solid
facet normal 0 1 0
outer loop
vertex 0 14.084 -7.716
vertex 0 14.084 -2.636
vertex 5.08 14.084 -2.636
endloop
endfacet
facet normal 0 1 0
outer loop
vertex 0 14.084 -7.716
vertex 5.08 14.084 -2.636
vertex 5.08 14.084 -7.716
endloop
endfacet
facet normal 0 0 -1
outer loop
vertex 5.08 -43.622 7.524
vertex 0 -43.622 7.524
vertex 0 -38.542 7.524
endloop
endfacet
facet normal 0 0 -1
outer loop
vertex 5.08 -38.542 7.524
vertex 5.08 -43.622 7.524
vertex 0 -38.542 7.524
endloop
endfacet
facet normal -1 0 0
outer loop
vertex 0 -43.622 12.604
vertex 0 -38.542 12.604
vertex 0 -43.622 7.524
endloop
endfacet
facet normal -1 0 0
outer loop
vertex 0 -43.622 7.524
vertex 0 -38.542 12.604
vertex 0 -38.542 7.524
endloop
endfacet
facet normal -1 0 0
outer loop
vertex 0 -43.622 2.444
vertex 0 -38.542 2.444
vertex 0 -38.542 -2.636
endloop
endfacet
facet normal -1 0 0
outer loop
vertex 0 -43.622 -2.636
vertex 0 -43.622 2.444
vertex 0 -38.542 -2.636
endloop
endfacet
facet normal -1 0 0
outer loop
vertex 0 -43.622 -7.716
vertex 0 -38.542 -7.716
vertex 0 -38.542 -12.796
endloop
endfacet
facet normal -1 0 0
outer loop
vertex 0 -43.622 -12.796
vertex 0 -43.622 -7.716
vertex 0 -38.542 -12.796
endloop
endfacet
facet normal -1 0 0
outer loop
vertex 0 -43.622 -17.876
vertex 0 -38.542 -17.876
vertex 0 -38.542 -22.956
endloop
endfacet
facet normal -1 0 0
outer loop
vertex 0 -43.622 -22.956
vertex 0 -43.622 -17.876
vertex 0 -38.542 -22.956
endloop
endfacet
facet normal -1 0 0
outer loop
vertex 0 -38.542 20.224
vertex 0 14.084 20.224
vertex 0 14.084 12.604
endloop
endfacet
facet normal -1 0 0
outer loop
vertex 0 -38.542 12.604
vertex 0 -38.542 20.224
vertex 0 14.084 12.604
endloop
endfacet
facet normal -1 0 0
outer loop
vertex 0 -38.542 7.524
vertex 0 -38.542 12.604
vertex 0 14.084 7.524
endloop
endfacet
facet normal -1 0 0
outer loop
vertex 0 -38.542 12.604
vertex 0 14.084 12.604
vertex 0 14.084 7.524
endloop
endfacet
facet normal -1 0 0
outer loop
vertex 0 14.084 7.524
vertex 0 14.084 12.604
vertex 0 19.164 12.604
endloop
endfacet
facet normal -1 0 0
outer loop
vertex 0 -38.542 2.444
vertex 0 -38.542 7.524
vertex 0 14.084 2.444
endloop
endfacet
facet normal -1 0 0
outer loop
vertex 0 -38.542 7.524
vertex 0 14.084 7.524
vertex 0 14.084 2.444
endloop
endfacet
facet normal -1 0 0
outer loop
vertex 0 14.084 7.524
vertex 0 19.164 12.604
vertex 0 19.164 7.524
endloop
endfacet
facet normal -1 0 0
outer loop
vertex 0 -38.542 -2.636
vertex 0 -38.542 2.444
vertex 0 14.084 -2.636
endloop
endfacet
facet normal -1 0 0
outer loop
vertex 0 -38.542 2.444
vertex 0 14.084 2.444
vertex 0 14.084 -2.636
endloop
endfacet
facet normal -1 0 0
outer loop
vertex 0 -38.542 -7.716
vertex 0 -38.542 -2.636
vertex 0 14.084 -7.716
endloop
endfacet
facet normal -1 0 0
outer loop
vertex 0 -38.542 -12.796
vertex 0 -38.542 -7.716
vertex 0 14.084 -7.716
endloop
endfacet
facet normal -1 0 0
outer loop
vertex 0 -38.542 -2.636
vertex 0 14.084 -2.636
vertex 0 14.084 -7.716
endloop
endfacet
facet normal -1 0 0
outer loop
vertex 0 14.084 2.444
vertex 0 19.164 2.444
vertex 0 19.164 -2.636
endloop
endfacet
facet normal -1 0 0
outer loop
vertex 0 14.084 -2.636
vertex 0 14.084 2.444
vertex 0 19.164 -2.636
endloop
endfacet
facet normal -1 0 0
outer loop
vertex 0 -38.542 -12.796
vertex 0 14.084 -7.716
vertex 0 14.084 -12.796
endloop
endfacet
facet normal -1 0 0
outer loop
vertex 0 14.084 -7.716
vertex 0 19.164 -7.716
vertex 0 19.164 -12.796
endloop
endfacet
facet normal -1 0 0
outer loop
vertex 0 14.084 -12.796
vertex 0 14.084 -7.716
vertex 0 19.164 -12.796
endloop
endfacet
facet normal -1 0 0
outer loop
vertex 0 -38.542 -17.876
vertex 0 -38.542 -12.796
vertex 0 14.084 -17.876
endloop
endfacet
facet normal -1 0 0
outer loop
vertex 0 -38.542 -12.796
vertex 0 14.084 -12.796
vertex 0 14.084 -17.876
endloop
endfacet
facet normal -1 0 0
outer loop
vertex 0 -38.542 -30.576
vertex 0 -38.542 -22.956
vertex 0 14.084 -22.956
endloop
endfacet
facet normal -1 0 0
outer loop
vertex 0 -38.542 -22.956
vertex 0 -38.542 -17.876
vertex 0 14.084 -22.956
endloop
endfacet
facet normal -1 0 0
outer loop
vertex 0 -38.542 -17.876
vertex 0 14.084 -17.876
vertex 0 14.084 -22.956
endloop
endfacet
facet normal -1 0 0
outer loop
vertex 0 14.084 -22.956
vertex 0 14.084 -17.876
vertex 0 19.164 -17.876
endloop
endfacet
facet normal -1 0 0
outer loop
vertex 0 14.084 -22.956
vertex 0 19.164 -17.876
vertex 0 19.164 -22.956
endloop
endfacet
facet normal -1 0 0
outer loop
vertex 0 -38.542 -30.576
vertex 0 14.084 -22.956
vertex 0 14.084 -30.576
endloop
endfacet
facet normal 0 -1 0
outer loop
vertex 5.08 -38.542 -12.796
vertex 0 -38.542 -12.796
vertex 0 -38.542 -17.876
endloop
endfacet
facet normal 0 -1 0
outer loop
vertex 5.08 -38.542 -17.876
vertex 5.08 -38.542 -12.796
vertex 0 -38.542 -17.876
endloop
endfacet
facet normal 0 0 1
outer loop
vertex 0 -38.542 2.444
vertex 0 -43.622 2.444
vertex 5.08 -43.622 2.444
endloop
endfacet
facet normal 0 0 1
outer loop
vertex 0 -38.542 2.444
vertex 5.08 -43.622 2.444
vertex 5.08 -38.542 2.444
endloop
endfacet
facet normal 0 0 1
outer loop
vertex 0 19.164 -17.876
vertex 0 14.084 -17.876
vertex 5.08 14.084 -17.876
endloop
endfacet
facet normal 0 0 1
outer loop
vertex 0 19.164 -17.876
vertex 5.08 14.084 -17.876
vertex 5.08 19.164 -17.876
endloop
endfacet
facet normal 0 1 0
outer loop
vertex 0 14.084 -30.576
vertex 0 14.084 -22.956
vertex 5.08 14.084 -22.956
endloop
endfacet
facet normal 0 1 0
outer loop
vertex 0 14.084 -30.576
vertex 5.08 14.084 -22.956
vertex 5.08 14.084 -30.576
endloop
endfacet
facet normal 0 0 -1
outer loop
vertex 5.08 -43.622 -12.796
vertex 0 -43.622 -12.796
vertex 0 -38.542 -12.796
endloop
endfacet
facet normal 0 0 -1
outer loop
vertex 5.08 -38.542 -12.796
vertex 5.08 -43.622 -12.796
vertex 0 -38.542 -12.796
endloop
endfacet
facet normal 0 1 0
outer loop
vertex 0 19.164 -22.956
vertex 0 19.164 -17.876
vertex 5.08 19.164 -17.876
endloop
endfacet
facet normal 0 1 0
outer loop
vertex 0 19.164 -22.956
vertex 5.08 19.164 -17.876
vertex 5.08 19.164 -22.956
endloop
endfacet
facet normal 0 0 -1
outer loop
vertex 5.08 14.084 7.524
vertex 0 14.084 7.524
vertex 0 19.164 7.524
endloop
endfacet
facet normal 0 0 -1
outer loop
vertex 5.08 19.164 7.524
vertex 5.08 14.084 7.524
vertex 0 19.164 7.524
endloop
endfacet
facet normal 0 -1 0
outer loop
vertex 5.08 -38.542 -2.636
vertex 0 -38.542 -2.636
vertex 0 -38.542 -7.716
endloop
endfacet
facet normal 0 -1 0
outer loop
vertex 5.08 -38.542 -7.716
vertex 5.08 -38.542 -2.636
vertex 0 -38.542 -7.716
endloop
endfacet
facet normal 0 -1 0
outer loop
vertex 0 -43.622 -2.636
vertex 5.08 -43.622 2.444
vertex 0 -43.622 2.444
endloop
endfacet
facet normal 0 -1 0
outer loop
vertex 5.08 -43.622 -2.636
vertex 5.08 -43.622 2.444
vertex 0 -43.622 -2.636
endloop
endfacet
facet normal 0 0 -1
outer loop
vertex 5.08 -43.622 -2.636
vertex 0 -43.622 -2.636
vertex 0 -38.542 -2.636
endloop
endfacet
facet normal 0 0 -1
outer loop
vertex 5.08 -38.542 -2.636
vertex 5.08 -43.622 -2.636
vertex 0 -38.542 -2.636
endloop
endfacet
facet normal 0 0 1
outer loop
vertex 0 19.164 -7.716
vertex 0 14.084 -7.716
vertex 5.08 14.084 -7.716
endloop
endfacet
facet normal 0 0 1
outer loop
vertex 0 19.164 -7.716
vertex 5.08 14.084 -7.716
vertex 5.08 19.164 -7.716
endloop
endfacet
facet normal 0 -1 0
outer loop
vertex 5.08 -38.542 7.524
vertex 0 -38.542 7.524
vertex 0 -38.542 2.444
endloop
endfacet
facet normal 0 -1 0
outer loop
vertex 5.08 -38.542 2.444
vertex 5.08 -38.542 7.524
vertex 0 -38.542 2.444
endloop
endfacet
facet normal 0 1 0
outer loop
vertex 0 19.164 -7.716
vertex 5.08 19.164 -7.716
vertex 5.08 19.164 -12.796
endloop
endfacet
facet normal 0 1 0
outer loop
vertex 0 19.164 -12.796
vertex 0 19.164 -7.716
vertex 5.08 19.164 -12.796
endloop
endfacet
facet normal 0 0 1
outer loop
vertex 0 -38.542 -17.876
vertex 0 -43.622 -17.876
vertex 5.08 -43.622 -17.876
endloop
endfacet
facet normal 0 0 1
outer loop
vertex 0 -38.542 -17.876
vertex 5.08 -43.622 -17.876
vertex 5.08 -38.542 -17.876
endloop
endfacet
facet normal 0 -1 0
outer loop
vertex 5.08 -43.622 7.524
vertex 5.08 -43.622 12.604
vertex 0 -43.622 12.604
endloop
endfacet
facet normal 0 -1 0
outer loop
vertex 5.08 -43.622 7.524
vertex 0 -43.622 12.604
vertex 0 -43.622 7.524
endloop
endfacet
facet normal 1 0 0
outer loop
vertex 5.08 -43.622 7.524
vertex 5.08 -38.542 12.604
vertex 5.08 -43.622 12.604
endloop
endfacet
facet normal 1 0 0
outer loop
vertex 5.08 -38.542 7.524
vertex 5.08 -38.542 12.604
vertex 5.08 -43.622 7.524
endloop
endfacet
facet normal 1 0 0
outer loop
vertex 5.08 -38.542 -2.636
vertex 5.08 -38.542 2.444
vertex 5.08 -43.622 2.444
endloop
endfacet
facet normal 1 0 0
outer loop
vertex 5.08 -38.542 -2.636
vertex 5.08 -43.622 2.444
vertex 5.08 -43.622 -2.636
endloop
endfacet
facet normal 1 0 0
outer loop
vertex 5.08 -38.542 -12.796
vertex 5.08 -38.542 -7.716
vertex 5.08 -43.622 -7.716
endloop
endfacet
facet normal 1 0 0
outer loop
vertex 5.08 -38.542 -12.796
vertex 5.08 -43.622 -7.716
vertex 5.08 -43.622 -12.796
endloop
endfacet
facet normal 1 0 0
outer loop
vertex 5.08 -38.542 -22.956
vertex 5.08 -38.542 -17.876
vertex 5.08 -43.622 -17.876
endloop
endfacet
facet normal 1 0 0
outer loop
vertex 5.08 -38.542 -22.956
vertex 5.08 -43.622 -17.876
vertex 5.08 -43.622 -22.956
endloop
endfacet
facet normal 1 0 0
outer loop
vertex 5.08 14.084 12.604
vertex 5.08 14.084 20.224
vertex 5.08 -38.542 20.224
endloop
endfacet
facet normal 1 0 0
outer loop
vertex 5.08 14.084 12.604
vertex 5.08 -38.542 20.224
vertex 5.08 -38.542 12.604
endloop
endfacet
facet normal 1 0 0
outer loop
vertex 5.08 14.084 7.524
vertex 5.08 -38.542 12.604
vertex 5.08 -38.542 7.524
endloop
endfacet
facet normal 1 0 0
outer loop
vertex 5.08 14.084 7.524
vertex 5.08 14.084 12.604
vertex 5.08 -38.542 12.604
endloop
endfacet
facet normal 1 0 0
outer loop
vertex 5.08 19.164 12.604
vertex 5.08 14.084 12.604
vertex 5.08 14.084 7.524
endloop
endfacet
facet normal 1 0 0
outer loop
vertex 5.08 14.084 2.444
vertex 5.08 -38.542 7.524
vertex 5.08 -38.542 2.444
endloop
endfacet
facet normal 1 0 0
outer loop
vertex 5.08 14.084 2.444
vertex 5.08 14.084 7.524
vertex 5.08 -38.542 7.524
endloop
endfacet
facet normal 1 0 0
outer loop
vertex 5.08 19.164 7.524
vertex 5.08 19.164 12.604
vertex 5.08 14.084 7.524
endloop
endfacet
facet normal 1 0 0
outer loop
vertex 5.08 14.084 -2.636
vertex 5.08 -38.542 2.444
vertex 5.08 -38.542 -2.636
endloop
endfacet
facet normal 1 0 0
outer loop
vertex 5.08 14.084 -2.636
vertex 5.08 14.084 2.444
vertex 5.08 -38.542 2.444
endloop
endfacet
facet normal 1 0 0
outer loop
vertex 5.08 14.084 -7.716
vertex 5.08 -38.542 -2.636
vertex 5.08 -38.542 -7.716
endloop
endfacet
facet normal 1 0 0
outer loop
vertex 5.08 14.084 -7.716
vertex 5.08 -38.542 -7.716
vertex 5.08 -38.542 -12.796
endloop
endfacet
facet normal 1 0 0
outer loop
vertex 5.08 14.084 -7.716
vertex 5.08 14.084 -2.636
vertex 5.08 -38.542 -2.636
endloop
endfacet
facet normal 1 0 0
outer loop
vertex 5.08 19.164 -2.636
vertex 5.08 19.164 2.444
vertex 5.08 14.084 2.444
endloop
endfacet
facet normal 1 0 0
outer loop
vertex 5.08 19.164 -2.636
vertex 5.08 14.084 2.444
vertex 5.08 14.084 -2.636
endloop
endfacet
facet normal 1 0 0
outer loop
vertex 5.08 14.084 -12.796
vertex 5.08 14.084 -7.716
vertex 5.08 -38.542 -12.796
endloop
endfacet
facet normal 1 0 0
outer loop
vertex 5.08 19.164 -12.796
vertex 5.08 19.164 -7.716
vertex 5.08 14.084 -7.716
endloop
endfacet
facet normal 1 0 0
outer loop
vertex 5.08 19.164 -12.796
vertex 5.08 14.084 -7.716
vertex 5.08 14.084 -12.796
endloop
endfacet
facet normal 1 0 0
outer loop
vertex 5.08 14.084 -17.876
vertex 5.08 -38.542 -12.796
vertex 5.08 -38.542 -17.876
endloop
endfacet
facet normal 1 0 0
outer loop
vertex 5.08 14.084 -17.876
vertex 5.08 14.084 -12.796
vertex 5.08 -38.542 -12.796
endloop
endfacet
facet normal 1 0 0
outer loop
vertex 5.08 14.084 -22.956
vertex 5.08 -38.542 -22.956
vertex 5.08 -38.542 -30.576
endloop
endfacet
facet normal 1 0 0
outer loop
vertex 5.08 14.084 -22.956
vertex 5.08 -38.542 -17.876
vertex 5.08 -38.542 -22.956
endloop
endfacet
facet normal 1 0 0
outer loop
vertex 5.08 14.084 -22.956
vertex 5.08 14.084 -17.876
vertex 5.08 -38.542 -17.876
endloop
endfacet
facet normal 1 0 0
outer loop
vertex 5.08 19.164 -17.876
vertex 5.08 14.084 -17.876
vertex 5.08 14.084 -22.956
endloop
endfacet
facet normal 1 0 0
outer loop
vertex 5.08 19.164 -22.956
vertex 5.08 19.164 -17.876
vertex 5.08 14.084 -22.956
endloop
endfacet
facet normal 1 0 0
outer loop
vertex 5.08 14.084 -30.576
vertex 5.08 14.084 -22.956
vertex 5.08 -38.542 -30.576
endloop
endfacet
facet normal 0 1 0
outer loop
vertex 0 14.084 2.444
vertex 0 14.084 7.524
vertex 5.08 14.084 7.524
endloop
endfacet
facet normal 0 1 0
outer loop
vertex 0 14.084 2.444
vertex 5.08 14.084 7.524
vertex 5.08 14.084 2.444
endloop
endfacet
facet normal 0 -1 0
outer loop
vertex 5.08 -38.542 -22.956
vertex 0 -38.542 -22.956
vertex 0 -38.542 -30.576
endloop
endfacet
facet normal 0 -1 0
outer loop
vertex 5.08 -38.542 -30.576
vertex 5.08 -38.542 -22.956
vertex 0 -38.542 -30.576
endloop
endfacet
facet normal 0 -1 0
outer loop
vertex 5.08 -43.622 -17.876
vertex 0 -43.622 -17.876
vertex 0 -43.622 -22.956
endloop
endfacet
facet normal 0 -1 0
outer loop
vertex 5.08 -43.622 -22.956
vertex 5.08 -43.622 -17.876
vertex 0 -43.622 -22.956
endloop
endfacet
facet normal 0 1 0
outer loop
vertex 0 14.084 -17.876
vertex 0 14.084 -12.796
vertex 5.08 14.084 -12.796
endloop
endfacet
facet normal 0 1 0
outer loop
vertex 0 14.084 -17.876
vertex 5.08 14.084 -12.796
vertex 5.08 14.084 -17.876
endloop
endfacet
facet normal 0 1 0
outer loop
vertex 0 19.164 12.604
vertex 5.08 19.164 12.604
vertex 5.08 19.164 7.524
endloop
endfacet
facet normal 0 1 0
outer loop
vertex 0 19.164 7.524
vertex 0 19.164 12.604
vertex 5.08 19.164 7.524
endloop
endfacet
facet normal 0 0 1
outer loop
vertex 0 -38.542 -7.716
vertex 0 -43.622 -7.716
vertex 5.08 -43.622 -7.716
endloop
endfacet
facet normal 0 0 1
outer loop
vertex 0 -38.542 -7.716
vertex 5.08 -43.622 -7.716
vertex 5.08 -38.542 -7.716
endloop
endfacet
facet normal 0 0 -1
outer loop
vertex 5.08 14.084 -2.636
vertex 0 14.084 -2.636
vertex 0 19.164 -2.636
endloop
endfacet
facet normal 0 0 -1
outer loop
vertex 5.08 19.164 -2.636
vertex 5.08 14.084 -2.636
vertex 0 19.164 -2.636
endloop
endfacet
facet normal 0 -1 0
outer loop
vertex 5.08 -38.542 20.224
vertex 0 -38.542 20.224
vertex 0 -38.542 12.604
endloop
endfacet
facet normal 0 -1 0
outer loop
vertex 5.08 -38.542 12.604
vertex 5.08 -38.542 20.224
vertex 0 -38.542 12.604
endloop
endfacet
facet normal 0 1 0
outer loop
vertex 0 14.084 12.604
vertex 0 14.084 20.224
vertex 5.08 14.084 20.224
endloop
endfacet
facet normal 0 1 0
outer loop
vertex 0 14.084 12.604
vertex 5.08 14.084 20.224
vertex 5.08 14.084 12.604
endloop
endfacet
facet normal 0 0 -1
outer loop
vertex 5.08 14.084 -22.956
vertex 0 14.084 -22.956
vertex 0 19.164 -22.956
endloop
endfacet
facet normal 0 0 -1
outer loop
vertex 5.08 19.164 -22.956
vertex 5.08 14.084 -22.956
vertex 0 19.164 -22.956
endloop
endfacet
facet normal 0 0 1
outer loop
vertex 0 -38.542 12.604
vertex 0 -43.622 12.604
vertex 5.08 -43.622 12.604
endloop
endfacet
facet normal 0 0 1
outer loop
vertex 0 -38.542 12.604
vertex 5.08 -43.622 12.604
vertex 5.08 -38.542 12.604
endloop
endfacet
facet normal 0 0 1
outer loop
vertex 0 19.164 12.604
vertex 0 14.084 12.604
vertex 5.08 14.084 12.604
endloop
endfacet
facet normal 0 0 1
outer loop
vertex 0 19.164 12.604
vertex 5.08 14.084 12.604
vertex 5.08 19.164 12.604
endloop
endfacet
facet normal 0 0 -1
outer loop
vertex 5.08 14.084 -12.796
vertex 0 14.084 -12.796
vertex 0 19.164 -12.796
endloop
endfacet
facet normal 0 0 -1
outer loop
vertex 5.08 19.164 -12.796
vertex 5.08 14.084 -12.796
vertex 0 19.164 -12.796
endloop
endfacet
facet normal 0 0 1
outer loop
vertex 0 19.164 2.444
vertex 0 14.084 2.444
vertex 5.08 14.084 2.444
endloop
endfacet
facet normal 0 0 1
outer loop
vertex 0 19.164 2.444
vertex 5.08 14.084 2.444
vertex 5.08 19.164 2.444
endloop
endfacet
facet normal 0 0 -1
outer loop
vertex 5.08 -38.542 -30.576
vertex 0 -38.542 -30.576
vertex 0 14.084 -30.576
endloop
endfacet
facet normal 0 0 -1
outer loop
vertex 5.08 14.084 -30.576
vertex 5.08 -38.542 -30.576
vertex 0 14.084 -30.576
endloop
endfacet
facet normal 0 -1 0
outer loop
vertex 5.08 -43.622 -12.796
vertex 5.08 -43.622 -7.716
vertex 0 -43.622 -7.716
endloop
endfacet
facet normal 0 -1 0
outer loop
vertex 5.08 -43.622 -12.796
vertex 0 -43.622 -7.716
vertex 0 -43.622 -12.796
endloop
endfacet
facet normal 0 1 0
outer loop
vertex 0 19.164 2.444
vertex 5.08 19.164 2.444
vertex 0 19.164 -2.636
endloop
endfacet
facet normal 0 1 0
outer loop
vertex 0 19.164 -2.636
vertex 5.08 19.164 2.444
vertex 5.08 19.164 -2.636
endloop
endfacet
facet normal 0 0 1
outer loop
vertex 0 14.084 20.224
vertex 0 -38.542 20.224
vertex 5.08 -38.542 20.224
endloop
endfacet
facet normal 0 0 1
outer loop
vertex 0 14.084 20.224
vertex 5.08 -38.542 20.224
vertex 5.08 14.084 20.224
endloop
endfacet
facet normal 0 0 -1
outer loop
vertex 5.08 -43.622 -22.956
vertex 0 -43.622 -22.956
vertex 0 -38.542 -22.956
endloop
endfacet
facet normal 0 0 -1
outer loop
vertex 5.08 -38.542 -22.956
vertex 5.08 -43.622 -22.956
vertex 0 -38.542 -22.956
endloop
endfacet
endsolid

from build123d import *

# Parameters (mm, degrees)
SKETCH1_W           = 50.8
SKETCH1_H           = 52.62626
BOSS_EXTRUDE1_DEPTH = 5.08
SKETCH2_W           = 5.08
SKETCH2_H           = 5.08
BOSS_EXTRUDE2_DEPTH = 5.08


with BuildPart() as part:
    # Sketch1 → Boss-Extrude1 (new body)
    with BuildSketch(Plane(origin=(0, 0, 0), x_dir=(0, 0, -1), z_dir=(1, 0, 0))):
        with Locations((5.176303318, -12.22876981)):
            Rectangle(SKETCH1_W, SKETCH1_H)
    extrude(amount=BOSS_EXTRUDE1_DEPTH)

    # Sketch2 → Boss-Extrude2 (add)
    with BuildSketch(Plane(origin=(5.08, 0, 0), x_dir=(0, 0, -1), z_dir=(1, 0, 0))):
        with Locations((-10.063696682, 16.62436019)):
            Rectangle(SKETCH2_W, SKETCH2_H)
        with Locations((10.256303318, 16.62436019)):
            Rectangle(SKETCH2_W, SKETCH2_H)
        with Locations((20.416303318, 16.62436019)):
            Rectangle(SKETCH2_W, SKETCH2_H)
        with Locations((0.096303318, 16.62436019)):
            Rectangle(SKETCH2_W, SKETCH2_H)
        with Locations((0.096303318, -41.08189981)):
            Rectangle(SKETCH2_W, SKETCH2_H)
        with Locations((-10.063696682, -41.08189981)):
            Rectangle(SKETCH2_W, SKETCH2_H)
        with Locations((20.416303318, -41.08189981)):
            Rectangle(SKETCH2_W, SKETCH2_H)
        with Locations((10.256303318, -41.08189981)):
            Rectangle(SKETCH2_W, SKETCH2_H)
    extrude(amount=-BOSS_EXTRUDE2_DEPTH)


solid = part.part
